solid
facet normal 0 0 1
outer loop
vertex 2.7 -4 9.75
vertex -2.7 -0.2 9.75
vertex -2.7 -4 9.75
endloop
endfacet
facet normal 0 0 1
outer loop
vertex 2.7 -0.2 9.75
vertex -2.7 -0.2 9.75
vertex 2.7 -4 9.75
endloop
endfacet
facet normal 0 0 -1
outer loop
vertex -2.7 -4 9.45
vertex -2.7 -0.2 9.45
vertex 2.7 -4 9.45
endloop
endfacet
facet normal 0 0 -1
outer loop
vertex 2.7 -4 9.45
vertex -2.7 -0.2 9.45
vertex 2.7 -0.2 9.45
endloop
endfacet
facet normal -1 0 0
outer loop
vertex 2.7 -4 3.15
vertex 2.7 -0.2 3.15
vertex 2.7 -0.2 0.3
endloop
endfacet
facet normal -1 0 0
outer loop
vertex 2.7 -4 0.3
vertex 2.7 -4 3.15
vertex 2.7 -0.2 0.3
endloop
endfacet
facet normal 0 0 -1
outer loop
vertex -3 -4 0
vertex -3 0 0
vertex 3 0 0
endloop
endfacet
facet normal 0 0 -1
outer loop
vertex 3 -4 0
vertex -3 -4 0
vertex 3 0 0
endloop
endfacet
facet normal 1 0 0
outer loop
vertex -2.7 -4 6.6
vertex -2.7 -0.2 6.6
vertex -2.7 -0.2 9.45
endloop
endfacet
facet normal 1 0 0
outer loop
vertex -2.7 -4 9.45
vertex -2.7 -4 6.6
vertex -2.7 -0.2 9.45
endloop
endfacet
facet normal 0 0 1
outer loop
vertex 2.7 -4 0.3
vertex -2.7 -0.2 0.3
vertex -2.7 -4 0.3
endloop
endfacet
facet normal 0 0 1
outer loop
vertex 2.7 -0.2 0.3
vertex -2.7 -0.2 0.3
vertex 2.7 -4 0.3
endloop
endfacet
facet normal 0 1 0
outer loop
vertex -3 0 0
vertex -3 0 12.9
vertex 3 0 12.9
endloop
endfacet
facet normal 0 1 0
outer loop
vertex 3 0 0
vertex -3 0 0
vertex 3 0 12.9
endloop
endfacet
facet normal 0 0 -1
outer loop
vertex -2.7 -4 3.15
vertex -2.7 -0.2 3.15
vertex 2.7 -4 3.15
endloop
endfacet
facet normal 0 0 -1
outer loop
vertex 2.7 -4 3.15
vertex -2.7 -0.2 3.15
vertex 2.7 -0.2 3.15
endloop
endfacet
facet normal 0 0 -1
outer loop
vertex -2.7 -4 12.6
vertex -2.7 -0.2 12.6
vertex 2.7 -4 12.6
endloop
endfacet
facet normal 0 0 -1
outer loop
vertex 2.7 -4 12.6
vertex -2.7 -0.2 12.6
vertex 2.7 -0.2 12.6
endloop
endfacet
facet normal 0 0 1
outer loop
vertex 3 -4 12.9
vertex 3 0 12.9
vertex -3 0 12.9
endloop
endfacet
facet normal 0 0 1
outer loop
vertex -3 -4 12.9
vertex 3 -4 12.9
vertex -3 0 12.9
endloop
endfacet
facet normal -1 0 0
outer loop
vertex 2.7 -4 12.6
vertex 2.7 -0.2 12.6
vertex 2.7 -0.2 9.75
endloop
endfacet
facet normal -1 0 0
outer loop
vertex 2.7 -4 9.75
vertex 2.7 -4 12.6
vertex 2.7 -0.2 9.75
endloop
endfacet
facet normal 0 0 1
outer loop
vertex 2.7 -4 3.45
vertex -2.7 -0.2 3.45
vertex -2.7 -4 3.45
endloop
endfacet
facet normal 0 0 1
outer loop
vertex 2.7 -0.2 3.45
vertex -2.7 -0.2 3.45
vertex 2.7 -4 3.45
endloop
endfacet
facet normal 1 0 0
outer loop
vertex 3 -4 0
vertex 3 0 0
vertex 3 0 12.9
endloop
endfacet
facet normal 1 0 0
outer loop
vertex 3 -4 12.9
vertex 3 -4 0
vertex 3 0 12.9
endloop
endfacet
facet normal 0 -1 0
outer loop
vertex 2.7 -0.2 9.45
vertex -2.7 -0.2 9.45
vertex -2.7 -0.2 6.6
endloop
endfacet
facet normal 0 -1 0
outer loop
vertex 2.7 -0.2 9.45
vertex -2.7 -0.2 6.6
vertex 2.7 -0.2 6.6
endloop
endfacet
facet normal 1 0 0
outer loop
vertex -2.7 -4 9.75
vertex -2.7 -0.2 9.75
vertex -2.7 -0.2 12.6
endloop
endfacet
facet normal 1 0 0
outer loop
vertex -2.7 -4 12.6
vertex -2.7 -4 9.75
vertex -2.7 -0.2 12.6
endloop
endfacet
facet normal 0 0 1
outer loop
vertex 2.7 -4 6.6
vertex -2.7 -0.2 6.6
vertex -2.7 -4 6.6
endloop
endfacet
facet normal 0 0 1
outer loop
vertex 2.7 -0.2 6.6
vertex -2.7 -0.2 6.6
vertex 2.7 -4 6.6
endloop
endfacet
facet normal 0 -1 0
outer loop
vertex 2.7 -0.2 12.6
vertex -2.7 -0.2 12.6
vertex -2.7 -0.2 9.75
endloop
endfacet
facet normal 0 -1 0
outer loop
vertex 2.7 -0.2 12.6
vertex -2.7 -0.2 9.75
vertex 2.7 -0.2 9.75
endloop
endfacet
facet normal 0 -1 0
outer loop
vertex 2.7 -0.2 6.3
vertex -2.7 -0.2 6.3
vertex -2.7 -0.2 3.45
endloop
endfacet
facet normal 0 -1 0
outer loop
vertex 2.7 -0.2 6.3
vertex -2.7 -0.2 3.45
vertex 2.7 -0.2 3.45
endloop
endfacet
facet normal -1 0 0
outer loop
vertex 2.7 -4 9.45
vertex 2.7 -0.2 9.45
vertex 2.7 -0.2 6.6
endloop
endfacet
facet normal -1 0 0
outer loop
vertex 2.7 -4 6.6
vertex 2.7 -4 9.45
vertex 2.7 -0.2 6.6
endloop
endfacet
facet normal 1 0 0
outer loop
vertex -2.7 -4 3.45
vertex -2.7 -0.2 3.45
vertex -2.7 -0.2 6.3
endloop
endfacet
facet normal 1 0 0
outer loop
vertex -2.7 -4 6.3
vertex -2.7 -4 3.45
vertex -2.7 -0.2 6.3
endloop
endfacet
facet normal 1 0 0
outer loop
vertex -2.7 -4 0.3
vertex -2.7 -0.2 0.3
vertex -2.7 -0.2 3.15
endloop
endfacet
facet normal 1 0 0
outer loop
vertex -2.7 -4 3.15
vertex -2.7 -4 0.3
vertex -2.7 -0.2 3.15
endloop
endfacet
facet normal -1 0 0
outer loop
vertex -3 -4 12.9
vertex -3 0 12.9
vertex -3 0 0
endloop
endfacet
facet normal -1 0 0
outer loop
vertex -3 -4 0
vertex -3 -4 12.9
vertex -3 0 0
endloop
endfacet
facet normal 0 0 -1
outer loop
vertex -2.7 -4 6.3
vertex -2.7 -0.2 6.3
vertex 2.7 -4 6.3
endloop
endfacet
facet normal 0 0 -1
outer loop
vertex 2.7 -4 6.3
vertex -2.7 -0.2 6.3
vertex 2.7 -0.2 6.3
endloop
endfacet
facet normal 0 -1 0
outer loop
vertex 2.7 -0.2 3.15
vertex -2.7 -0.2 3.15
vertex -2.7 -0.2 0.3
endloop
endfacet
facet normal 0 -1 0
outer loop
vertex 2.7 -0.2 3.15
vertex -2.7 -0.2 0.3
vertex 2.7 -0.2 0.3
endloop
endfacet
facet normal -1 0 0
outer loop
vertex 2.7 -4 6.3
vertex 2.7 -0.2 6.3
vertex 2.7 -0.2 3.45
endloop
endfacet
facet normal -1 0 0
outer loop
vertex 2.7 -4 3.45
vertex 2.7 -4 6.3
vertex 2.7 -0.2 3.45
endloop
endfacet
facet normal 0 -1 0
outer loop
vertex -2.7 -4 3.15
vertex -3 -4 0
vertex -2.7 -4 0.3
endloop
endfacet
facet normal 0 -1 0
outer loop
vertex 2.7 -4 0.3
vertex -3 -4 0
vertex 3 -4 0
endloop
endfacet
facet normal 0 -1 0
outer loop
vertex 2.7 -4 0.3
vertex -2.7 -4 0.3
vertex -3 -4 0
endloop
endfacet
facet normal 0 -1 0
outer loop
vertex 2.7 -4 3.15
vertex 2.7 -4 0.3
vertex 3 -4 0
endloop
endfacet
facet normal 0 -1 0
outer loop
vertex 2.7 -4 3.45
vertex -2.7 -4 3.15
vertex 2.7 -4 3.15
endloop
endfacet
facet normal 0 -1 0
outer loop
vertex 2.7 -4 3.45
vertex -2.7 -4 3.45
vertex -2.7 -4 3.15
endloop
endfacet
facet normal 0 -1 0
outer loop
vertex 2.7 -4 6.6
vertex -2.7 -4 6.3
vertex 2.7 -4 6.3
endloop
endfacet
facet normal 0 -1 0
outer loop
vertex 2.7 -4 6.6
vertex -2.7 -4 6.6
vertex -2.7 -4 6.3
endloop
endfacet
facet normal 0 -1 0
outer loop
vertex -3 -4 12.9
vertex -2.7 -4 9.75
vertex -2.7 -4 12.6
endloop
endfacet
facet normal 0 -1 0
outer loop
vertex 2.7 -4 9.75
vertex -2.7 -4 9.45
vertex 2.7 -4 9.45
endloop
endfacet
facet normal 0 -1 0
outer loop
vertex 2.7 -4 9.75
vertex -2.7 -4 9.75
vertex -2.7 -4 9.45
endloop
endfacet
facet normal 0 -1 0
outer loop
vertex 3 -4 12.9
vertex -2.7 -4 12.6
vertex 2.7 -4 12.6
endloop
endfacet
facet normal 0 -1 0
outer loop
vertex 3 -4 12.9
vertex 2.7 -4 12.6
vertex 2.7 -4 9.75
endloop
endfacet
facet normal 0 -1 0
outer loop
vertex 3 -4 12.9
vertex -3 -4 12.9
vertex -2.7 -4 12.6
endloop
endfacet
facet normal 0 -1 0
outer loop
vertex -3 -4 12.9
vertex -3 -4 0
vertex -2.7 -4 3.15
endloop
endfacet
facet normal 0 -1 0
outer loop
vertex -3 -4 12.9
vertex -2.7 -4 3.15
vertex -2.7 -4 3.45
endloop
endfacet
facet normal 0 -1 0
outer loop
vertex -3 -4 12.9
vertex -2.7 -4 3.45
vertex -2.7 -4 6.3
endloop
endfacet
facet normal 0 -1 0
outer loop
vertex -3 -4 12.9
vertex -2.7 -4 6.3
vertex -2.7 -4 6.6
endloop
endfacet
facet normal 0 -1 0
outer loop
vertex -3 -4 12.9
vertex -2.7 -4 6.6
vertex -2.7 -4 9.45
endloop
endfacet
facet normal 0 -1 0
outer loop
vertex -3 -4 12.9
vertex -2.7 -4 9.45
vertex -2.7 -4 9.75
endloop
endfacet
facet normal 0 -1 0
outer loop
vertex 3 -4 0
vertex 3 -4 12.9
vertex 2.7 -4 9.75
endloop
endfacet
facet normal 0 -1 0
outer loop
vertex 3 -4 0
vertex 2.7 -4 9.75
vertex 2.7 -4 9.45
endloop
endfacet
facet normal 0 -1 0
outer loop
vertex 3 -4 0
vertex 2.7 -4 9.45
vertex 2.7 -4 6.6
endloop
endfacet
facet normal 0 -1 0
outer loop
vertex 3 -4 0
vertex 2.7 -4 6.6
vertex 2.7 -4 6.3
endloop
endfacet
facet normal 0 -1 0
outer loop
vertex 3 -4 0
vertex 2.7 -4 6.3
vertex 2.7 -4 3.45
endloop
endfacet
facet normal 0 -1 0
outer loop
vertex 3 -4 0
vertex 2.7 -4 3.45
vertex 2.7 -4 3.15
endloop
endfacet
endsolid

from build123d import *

# Parameters (mm, degrees)
F0_W     = 5.4
F0_H     = 0.3
F1_DEPTH = 4
F0_H_2   = 2.85
F2_DEPTH = 0.2


with BuildPart() as f1:
    # F0 (on Front) → F1 (new body)
    with BuildSketch(Plane.XZ):
        Polygon((-3, 12.9), (-3, 0), (-2.7, 0), (-2.7, 0.3), (-2.7, 3.15), (-2.7, 3.45), (-2.7, 6.3), (-2.7, 6.6), (-2.7, 9.45), (-2.7, 9.75), (-2.7, 12.6), (-2.7, 12.9), align=None)
        Polygon((2.7, 0.3), (2.7, 0), (3, 0), (3, 12.9), (2.7, 12.9), (2.7, 12.6), (2.7, 9.75), (2.7, 9.45), (2.7, 6.6), (2.7, 6.3), (2.7, 3.45), (2.7, 3.15), align=None)
        with Locations((0, 12.75)):
            Rectangle(F0_W, F0_H)
        with Locations((0, 9.6)):
            Rectangle(F0_W, F0_H)
        with Locations((0, 6.45)):
            Rectangle(F0_W, F0_H)
        with Locations((0, 3.3)):
            Rectangle(F0_W, F0_H)
        with Locations((0, 0.15)):
            Rectangle(F0_W, F0_H)
    extrude(amount=F1_DEPTH)

    # F0 (on Front) → F2 (join)
    with BuildSketch(Plane.XZ):
        with Locations((0, 11.175)):
            Rectangle(F0_W, F0_H_2)
        with Locations((0, 4.875)):
            Rectangle(F0_W, F0_H_2)
        with Locations((0, 1.725)):
            Rectangle(F0_W, F0_H_2)
        with Locations((0, 8.025)):
            Rectangle(F0_W, F0_H_2)
    extrude(amount=F2_DEPTH)


solid = f1.part
